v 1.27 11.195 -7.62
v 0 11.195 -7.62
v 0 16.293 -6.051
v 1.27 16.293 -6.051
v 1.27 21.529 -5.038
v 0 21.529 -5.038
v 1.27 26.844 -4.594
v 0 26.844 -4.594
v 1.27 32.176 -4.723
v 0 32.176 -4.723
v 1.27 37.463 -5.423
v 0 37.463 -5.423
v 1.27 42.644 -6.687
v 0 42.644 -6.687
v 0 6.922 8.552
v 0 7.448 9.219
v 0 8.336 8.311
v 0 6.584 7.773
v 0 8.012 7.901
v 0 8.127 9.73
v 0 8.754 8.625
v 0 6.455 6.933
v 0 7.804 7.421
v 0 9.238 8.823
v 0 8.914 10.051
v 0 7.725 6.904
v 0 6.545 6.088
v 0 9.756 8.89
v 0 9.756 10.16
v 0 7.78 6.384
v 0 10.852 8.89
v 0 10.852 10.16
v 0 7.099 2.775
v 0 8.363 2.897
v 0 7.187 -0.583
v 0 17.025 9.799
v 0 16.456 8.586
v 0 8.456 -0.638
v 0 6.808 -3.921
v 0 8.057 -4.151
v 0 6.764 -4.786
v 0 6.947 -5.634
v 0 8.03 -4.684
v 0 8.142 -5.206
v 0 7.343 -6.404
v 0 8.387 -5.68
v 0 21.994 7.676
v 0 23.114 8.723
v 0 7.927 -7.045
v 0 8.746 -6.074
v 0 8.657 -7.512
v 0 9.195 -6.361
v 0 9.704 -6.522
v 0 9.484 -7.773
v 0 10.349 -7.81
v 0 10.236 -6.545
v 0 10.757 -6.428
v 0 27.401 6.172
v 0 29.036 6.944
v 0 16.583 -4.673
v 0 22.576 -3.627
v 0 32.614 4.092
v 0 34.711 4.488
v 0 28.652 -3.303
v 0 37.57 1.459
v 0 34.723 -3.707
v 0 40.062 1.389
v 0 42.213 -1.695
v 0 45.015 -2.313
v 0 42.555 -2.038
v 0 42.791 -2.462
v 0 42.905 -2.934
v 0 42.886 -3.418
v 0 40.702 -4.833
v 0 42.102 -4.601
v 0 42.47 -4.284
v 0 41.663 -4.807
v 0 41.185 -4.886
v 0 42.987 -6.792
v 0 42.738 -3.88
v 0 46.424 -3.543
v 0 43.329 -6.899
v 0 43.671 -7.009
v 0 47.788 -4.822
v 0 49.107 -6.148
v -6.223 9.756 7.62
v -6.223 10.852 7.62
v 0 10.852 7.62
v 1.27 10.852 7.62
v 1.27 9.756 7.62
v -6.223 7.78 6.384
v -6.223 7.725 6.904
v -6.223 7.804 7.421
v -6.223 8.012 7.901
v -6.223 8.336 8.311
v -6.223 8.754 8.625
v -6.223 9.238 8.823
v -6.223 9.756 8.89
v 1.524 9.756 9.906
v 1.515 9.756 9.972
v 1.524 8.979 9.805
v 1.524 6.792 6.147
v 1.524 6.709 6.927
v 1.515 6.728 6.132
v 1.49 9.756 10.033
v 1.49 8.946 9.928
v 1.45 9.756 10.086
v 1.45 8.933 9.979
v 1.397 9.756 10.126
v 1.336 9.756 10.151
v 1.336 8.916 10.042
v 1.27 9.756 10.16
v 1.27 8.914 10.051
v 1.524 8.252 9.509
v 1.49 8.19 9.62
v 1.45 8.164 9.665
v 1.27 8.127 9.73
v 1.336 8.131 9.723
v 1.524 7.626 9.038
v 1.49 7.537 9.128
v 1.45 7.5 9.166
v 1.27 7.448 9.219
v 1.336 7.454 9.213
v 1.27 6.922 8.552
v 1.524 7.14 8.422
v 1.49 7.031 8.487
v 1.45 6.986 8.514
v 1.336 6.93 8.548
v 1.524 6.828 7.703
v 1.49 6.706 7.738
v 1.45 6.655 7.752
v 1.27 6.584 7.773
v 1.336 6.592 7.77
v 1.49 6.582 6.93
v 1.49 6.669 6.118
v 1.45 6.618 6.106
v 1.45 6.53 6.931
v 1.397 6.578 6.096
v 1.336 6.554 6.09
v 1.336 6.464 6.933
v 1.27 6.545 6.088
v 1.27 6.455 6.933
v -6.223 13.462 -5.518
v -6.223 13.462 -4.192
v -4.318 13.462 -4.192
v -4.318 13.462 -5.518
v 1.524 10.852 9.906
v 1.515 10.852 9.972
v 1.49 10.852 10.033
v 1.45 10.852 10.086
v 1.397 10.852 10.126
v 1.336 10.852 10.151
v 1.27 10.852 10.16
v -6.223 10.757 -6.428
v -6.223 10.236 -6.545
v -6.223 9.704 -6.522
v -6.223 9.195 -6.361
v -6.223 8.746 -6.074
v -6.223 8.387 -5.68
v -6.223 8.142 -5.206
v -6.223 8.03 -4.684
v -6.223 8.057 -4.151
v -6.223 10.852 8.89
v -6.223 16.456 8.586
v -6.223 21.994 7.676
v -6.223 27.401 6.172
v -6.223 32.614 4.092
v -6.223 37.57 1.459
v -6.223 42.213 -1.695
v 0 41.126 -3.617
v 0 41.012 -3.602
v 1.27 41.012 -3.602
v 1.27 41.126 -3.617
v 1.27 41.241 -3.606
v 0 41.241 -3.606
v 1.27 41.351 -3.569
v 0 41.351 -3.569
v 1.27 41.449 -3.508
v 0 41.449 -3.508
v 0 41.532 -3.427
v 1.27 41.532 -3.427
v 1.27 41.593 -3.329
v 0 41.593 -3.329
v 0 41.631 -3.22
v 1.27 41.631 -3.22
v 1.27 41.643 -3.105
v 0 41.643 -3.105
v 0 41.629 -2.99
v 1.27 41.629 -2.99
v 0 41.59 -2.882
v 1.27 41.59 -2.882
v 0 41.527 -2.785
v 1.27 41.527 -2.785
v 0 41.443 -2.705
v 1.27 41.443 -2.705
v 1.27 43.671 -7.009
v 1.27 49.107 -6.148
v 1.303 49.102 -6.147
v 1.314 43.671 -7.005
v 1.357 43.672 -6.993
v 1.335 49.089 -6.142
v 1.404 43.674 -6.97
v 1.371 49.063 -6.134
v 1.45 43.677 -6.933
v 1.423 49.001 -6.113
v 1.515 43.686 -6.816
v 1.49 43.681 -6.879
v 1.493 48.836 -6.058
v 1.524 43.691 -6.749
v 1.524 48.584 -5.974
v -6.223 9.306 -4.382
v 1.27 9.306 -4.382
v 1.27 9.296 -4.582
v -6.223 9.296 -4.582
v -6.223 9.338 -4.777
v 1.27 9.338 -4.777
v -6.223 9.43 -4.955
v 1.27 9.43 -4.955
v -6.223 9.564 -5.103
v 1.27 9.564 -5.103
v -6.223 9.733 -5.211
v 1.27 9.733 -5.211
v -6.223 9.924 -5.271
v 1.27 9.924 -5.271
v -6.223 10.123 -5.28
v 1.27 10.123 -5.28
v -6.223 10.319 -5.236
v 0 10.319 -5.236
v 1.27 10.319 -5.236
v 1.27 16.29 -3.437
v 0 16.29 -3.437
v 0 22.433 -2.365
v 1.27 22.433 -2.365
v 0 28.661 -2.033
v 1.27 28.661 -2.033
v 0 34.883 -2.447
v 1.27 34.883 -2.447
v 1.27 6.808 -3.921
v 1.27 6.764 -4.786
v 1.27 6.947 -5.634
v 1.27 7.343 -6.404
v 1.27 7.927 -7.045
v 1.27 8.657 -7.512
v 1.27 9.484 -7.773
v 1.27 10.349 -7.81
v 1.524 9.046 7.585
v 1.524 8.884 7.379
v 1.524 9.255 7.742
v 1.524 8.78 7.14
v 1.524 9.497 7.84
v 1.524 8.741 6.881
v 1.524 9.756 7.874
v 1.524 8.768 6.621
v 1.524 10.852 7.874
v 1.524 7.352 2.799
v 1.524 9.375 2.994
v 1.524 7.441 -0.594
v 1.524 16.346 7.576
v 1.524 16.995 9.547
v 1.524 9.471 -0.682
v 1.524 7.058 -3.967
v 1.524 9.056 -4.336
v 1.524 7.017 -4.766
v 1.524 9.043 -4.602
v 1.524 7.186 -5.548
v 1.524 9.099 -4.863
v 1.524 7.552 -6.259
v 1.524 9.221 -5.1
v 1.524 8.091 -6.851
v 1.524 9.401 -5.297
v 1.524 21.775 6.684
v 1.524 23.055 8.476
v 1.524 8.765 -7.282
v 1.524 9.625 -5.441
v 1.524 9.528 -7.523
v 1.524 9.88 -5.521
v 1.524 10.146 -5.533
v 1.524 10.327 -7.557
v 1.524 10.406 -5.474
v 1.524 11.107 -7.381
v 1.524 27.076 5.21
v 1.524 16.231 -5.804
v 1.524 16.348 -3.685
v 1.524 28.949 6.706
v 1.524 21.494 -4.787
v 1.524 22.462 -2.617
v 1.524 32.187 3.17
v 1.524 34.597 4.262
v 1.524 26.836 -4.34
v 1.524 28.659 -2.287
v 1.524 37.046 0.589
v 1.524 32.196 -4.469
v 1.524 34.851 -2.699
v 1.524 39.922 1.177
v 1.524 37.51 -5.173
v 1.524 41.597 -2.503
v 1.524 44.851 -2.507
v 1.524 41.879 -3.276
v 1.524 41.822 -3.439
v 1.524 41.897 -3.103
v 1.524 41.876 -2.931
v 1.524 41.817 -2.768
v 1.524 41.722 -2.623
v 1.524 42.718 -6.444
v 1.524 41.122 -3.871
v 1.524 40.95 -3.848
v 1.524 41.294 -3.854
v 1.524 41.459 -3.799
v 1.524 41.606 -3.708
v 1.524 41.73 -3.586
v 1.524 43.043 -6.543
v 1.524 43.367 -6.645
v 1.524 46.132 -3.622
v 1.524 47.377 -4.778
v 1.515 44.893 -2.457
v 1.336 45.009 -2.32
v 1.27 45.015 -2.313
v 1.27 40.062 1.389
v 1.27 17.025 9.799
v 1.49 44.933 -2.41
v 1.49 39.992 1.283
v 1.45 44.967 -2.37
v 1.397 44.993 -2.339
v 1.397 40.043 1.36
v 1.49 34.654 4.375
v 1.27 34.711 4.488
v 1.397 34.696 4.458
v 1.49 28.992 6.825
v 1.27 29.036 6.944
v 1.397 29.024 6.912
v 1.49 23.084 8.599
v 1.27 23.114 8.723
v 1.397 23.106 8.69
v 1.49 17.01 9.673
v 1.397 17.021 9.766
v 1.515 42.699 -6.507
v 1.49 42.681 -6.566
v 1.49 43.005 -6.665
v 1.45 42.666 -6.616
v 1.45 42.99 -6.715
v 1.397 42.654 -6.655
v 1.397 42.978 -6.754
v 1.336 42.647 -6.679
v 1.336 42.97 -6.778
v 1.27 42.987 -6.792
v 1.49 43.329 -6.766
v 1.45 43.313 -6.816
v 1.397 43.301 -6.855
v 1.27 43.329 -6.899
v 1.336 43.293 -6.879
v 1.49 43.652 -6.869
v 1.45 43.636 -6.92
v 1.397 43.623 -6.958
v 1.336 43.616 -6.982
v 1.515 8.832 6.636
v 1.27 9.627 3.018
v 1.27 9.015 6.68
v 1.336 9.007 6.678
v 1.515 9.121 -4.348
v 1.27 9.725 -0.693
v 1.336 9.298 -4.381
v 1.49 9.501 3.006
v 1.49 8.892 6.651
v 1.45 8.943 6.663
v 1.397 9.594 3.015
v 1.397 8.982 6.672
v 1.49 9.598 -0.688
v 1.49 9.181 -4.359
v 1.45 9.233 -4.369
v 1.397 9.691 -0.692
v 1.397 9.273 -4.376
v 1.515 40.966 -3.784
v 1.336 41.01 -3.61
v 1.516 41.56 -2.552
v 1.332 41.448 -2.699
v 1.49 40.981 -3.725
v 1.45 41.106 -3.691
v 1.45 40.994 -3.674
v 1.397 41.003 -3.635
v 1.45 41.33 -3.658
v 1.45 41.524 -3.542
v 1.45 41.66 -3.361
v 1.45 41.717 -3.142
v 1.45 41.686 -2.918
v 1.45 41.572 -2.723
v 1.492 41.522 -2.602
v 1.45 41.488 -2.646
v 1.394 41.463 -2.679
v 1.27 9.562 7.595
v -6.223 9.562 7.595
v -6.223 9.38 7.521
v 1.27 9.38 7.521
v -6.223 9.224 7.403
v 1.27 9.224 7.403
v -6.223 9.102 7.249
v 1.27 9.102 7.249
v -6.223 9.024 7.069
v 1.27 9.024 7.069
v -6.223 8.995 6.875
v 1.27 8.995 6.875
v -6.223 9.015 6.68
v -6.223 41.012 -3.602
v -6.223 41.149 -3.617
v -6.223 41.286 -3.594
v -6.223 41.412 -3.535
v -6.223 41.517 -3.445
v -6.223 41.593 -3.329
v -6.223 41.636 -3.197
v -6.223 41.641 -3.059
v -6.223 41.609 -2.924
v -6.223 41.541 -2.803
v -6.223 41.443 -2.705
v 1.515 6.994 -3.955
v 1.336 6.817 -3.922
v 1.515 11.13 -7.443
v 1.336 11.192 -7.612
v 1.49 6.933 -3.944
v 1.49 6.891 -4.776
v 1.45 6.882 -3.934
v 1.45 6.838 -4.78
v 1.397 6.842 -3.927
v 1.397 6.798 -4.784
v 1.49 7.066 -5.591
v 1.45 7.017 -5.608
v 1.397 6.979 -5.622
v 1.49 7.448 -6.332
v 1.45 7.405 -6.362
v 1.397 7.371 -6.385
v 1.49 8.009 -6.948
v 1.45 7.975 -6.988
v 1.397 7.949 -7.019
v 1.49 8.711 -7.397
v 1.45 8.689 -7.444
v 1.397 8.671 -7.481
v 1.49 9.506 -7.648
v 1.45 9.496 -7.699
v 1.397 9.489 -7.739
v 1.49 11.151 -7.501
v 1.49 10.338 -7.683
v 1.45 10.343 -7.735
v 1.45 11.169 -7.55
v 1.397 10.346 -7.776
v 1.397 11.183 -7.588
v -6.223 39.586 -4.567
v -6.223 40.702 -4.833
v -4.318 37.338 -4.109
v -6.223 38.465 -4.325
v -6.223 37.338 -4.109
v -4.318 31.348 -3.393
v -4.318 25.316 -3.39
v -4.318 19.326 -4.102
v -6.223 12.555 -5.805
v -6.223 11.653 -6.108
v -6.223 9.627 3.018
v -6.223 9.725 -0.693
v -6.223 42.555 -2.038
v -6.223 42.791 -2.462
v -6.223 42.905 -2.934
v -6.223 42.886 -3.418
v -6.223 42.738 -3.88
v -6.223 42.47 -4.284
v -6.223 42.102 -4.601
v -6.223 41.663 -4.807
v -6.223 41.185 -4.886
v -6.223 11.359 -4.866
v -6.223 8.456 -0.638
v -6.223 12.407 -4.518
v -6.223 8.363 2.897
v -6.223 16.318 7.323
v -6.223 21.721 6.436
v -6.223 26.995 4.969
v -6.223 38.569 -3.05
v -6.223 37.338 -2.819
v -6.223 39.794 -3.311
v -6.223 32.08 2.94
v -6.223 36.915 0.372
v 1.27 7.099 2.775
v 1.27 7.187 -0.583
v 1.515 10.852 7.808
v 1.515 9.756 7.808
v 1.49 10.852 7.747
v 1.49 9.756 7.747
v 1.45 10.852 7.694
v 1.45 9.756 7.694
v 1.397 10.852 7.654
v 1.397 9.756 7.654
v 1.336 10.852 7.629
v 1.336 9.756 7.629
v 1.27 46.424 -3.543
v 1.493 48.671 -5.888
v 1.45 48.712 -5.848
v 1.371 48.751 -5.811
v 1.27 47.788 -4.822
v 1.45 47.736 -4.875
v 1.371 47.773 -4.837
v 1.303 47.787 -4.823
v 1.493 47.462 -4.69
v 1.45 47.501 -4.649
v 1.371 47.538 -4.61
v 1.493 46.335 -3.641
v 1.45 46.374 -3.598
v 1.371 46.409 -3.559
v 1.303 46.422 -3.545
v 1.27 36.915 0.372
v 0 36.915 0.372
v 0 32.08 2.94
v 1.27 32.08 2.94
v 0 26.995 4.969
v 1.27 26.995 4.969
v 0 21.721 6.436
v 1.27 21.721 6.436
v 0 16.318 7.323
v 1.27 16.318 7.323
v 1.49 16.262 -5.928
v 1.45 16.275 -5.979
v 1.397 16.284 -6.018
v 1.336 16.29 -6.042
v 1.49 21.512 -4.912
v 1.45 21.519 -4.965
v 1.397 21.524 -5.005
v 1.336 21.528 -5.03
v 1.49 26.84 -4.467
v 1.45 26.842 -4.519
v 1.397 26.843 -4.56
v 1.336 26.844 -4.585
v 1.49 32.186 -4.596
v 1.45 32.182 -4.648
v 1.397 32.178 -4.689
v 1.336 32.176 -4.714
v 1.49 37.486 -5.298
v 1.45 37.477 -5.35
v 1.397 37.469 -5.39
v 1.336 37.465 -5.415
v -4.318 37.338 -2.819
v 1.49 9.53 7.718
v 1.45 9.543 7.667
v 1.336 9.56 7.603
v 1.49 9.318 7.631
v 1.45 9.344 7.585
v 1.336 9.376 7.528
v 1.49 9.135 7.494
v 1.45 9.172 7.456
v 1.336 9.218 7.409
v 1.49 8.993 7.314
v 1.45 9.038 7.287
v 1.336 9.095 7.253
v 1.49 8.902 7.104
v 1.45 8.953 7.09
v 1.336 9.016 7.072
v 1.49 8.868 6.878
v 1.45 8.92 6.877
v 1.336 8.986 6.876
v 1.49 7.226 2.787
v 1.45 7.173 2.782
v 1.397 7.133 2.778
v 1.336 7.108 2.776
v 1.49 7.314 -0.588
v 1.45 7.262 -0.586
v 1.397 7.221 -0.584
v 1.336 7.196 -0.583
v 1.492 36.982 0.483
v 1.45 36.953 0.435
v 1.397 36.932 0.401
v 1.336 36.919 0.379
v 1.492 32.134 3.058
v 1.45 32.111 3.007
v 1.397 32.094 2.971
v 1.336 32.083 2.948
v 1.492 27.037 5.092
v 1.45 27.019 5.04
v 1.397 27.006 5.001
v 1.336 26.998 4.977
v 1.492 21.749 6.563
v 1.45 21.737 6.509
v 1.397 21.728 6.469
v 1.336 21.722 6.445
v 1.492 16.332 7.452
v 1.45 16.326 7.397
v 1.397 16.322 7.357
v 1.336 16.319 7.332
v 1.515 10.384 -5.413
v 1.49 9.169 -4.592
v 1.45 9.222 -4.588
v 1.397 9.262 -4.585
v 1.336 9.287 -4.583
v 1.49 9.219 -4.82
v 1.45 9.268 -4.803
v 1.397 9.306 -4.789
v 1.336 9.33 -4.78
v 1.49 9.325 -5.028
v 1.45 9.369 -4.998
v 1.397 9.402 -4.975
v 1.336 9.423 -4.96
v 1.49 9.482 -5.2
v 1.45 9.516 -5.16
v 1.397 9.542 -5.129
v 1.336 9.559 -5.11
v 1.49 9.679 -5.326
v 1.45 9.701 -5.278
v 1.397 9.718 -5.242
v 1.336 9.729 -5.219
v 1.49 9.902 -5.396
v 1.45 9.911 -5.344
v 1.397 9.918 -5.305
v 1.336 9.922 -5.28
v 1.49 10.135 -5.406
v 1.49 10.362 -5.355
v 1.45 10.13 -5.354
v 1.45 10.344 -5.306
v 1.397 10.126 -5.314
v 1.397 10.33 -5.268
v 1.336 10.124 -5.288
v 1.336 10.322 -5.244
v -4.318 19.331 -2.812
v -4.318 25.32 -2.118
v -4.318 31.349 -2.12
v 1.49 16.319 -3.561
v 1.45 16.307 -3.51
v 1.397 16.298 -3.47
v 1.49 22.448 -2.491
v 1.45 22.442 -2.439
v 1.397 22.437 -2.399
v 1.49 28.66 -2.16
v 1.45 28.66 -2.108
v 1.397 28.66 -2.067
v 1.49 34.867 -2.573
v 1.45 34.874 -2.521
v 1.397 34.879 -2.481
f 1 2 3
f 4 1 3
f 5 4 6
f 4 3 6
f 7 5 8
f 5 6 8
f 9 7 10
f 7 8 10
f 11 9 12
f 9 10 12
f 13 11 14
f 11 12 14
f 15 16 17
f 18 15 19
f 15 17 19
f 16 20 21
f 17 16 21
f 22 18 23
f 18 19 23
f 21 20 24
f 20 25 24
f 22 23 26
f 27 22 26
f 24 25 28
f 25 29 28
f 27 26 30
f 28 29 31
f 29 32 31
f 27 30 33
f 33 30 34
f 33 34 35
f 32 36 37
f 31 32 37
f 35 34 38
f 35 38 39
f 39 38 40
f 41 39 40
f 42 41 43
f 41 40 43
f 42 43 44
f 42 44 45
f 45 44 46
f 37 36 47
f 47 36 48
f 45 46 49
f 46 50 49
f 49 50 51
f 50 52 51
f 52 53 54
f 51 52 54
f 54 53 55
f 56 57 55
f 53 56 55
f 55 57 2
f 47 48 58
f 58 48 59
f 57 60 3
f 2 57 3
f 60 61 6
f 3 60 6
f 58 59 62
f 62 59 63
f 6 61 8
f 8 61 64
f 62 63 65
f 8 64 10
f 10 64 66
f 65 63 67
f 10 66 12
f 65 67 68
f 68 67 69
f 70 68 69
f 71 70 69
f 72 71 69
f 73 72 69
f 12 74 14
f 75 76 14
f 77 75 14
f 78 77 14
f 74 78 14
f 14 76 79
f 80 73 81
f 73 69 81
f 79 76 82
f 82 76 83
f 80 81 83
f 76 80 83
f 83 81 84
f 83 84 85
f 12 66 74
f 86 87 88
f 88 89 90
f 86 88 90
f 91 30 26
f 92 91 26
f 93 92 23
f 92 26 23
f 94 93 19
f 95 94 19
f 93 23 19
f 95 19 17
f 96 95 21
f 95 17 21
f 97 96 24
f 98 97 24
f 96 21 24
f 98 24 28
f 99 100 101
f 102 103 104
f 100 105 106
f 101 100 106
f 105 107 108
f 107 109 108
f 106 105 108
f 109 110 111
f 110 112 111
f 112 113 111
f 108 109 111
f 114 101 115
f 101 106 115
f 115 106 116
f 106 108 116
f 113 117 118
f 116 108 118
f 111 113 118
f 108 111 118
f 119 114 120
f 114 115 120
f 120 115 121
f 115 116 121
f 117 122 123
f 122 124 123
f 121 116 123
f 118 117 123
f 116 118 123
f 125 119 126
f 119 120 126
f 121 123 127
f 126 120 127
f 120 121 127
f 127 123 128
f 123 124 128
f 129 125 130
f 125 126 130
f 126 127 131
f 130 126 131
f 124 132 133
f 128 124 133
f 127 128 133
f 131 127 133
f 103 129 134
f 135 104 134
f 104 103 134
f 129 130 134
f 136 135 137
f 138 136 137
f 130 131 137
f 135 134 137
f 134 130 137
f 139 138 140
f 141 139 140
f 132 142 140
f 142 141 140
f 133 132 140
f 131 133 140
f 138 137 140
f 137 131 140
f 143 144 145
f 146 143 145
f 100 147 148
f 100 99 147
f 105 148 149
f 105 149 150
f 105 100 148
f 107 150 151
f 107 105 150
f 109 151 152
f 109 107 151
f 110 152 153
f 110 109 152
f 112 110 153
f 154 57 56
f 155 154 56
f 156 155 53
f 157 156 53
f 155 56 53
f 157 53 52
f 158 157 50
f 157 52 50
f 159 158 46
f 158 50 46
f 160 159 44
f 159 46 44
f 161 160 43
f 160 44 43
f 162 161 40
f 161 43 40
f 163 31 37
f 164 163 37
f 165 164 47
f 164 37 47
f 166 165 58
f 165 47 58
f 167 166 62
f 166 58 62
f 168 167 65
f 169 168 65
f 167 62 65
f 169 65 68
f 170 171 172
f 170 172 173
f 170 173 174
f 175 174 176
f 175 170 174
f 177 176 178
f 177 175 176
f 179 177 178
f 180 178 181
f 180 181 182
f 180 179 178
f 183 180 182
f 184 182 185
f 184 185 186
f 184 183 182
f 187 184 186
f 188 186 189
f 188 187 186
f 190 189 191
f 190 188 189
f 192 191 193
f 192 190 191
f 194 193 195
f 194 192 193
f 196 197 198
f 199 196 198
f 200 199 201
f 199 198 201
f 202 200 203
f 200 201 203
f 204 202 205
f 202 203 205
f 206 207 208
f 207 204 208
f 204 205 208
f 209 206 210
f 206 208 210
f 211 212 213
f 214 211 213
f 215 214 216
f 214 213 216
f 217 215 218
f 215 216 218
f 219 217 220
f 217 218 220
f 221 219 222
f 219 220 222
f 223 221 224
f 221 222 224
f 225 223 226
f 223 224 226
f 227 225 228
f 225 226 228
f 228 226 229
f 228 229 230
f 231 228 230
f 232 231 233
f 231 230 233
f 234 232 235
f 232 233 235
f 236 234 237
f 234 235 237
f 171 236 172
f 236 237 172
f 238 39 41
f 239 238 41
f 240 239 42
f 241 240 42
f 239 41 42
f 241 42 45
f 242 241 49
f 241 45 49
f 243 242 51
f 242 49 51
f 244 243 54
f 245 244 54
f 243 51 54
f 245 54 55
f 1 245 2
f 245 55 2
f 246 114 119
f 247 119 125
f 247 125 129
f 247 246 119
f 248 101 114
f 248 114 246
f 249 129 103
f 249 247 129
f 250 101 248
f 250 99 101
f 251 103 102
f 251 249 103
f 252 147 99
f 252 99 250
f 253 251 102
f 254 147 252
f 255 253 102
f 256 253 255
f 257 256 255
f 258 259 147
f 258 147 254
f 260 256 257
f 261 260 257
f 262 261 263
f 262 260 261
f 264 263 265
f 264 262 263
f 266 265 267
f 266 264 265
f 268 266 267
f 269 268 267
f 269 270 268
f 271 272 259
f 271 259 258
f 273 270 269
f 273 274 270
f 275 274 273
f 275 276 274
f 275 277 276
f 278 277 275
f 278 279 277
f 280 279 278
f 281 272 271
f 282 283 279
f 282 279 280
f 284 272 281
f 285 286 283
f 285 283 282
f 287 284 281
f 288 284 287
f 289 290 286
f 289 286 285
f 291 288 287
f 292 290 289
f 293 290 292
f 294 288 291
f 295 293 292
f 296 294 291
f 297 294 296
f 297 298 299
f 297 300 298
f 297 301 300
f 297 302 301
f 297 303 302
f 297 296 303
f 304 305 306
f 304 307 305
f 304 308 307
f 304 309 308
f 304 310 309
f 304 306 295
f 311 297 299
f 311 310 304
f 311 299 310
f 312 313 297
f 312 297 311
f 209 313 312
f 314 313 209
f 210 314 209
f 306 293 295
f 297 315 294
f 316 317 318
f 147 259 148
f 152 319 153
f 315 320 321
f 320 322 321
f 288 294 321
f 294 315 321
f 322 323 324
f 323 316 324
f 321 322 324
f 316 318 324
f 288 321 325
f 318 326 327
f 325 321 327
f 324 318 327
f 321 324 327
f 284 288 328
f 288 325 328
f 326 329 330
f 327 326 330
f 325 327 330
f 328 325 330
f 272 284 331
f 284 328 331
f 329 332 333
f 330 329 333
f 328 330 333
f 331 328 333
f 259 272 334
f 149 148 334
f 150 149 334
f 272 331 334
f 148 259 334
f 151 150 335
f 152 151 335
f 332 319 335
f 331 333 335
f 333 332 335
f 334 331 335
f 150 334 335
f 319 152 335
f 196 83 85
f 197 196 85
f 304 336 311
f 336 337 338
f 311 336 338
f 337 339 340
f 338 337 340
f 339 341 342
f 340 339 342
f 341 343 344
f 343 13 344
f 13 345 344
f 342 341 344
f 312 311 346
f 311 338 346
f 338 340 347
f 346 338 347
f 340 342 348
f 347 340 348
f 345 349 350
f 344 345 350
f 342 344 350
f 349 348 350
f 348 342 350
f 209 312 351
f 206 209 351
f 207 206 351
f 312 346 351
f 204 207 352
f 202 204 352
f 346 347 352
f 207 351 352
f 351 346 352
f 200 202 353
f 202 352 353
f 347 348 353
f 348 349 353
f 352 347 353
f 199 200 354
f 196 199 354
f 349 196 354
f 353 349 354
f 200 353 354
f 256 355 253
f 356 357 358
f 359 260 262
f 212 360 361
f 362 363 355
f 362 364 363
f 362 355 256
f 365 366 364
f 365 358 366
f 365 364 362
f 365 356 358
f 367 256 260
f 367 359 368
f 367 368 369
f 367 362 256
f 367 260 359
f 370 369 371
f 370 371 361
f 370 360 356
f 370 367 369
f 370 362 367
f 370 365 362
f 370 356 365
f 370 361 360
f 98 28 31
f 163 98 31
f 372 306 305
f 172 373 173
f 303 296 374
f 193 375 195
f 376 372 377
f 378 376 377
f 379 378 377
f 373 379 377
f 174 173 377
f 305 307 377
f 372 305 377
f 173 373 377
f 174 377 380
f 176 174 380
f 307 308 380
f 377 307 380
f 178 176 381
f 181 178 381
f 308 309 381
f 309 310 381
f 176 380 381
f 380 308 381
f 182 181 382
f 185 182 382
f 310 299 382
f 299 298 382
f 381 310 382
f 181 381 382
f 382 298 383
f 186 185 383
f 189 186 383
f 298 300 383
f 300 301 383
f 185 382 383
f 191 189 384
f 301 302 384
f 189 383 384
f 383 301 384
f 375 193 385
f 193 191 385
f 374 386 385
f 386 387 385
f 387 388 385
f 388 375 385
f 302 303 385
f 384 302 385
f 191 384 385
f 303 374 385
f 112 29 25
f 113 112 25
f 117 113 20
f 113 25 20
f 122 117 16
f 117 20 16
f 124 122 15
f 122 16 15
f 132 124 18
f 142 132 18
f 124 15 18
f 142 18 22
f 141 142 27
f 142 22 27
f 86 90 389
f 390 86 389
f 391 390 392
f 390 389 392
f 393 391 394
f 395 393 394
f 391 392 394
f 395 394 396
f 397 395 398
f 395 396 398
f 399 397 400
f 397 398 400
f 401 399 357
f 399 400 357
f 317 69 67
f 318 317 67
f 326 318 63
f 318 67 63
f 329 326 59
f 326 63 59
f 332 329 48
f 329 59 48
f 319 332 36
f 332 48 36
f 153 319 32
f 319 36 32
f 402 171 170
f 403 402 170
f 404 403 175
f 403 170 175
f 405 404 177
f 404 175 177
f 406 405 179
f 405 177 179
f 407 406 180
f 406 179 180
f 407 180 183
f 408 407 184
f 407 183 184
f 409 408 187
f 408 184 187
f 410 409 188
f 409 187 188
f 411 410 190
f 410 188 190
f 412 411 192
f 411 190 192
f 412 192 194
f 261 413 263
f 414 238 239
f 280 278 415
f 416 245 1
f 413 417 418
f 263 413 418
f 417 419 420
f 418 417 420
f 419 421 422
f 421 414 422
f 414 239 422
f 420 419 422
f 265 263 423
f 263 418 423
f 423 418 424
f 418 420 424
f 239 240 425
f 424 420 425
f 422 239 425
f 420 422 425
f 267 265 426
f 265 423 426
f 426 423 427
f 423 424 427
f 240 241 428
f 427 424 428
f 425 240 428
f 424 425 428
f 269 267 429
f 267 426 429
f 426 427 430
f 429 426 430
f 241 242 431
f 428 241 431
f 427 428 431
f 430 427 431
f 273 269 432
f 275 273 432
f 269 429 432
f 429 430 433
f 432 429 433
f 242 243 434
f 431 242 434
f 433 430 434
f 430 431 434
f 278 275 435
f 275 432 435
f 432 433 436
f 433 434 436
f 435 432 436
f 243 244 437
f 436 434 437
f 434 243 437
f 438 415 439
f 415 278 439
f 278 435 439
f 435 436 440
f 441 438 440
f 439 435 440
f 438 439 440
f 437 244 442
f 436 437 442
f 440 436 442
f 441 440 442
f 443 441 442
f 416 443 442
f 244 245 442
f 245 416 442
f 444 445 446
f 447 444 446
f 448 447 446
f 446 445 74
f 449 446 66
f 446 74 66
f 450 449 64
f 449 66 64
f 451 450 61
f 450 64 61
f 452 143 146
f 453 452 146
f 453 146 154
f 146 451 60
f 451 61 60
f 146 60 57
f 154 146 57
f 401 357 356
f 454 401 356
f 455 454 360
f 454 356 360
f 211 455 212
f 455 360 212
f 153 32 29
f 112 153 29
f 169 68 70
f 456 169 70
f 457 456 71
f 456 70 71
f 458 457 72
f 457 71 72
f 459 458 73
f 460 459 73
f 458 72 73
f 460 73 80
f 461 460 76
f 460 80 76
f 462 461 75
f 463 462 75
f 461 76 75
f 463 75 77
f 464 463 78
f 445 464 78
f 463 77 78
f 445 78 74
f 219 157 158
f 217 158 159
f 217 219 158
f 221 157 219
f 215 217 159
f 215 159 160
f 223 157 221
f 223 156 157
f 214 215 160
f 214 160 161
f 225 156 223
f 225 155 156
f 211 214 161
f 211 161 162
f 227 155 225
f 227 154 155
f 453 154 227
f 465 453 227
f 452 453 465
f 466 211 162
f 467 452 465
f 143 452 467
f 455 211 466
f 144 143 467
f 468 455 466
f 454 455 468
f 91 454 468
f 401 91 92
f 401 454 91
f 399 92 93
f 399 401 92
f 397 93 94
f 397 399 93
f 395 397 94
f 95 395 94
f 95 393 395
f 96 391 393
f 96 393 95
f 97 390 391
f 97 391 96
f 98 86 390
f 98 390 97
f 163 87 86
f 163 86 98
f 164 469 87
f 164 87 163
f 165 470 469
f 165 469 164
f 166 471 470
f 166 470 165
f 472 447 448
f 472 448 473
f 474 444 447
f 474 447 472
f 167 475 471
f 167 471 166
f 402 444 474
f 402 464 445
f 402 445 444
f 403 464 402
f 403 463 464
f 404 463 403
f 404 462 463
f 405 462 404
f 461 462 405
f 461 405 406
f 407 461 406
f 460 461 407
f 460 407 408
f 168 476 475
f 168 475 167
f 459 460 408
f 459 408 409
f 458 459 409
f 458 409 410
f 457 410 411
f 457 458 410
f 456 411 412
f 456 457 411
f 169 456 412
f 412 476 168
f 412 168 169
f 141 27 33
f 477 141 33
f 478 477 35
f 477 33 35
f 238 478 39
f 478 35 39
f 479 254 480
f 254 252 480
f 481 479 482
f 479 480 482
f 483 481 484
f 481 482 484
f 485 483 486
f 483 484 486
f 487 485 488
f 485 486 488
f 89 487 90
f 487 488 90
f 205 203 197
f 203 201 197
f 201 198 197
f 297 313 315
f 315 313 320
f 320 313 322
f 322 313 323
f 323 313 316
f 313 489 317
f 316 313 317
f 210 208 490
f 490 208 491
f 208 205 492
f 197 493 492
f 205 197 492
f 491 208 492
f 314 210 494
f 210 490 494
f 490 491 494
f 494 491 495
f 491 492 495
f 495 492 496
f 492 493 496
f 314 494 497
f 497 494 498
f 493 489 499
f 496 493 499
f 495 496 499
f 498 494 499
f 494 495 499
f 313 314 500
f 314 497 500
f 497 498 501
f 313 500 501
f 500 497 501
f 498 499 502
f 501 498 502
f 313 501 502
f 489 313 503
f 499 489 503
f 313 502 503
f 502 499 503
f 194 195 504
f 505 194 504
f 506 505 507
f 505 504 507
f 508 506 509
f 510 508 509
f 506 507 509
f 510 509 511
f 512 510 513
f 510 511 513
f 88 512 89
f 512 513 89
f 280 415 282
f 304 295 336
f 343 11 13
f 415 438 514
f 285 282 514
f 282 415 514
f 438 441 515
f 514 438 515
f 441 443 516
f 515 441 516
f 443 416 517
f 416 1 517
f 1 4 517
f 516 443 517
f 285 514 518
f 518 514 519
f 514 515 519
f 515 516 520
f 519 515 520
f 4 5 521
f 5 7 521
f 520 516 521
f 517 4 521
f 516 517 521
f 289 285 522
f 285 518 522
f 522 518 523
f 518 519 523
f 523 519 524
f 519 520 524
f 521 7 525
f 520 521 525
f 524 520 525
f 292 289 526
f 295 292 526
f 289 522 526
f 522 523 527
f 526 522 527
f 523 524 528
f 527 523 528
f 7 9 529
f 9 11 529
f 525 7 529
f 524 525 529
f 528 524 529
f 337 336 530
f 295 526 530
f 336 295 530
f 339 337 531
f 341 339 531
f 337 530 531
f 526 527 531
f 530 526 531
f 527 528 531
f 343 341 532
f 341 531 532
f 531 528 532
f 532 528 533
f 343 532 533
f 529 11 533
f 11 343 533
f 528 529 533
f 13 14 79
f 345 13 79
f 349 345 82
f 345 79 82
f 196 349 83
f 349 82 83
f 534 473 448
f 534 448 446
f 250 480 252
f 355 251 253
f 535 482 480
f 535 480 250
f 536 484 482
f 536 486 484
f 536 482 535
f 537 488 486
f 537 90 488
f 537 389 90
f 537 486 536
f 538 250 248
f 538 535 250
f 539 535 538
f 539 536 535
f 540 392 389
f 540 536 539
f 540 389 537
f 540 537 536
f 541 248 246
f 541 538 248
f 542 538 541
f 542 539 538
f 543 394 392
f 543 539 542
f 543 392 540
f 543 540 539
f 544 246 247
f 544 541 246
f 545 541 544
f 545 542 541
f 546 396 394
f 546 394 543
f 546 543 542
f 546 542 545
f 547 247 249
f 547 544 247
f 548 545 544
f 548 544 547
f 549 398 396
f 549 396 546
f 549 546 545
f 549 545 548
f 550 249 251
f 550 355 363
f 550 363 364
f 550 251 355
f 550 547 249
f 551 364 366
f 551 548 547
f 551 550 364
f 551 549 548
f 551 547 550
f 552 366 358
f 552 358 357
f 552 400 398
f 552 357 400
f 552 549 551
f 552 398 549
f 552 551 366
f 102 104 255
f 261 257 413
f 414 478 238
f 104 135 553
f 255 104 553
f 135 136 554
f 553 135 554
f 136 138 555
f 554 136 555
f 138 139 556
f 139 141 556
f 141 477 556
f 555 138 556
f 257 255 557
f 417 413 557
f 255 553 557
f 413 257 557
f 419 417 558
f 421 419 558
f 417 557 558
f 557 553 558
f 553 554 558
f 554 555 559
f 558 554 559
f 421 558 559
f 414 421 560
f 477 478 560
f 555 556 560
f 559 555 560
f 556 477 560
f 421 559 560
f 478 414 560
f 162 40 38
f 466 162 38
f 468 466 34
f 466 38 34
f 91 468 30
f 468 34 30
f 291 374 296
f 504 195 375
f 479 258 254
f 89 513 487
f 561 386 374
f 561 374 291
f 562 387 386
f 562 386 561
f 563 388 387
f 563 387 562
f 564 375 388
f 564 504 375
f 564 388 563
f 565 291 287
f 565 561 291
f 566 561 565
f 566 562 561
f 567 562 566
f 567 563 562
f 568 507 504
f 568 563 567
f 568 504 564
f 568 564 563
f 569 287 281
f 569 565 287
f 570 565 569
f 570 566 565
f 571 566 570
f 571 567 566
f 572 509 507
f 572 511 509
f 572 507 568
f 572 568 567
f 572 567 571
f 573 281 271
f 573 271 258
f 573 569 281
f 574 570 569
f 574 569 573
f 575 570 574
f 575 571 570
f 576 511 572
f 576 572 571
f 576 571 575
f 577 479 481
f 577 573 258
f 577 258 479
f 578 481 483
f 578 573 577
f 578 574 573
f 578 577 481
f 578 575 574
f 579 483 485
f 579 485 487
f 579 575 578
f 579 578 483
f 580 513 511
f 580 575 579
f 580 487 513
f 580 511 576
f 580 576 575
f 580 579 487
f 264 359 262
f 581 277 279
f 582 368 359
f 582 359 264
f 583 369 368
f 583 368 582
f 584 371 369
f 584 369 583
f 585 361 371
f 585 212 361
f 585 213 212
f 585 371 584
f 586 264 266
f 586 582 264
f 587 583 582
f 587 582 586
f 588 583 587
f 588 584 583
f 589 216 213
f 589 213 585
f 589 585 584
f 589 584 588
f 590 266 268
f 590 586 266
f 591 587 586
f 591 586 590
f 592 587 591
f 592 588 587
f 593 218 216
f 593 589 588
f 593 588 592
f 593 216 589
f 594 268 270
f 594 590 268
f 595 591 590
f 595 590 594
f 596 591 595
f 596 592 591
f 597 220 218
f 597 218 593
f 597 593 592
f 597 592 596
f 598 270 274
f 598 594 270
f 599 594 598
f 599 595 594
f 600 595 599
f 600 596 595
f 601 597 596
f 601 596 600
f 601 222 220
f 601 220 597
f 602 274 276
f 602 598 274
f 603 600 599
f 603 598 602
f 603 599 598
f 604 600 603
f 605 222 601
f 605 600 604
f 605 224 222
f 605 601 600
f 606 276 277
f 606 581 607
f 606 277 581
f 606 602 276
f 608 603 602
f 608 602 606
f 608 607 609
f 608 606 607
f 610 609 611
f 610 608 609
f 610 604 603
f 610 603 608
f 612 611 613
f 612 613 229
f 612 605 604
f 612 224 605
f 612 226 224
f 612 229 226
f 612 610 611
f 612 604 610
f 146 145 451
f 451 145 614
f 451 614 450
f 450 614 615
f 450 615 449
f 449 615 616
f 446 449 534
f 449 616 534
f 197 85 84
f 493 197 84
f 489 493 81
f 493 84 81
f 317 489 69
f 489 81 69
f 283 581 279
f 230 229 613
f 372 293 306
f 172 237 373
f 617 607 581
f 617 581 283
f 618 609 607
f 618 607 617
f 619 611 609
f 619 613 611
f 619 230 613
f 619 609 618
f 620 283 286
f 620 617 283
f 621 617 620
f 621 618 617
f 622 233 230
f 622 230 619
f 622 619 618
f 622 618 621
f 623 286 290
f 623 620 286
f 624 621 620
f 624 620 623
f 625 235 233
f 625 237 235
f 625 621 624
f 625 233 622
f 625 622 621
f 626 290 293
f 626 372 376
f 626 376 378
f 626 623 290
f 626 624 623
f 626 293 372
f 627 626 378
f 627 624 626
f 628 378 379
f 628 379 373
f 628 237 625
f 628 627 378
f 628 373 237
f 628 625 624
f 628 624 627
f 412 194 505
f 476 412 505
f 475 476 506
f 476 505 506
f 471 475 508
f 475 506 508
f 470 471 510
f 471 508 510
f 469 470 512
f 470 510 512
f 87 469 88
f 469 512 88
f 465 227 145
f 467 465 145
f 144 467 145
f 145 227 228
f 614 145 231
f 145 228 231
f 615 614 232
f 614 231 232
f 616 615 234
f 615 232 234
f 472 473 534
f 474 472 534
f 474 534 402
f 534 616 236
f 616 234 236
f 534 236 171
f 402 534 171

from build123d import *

# Parameters (mm, degrees)
BOSS_EXTRUDE1_DEPTH         = 1.524
KES_EKSTR_ZYON1_DEPTH       = 2.54
RADYUS1_R                   = 0.508
Y_KSEKLIK_EKSTR_ZYON1_DEPTH = 6.223
Y_KSEKLIK_EKSTR_ZYON2_START = -1.524
Y_KSEKLIK_EKSTR_ZYON2_DEPTH = 1.524
IZIM5_W                     = 1.905
IZIM5_H                     = 23.876
KES_EKSTR_ZYON2_DEPTH       = 9.779
RADYUS2_R                   = 0.254


with BuildPart() as part:
    # Sketch2 → Boss-Extrude1 (new body)
    with BuildSketch(Plane(origin=(0, 0, 0), x_dir=(0, 0, -1), z_dir=(1, 0, 0))):
        with BuildLine():
            Line((-10.16, 10.851579944), (-10.16, 9.756379827))
            ThreePointArc((-10.16, 9.756379827), (-8.902698353, 7.16361824), (-6.088278228, 6.54534691))
            ThreePointArc((-6.088278228, 6.54534691), (-1.097578785, 7.201770952), (3.920718614, 6.808496661))
            ThreePointArc((3.920718614, 6.808496661), (7.044965017, 7.926917254), (7.619757818, 11.195157369))
            ThreePointArc((7.619757818, 11.195157369), (4.593793799, 26.843864795), (6.687175028, 42.644379261))
            ThreePointArc((6.687175028, 42.644379261), (5.465660141, 45.611386582), (2.312998216, 45.014767901))
            ThreePointArc((2.312998216, 45.014767901), (-6.944233805, 29.036045126), (-10.16, 10.851579944))
        make_face()
    extrude(amount=BOSS_EXTRUDE1_DEPTH)

    # Sketch3 → Kes-Ekstrüzyon1 (cut)
    with BuildSketch(Plane(origin=(1.524, 0, 0), x_dir=(0, 0, -1), z_dir=(1, 0, 0))):
        with BuildLine():
            Line((-7.62, 10.851579944), (-7.62, 9.756379827))
            ThreePointArc((-7.62, 9.756379827), (-7.329853466, 9.15805023), (-6.680371899, 9.015372231))
            ThreePointArc((-6.680371899, 9.015372231), (-1.164335672, 9.74089354), (4.382203558, 9.306221955))
            ThreePointArc((4.382203558, 9.306221955), (5.103183497, 9.564319015), (5.23582799, 10.318528273))
            ThreePointArc((5.23582799, 10.318528273), (2.05490982, 26.768577734), (4.25548932, 43.378207999))
            ThreePointArc((4.25548932, 43.378207999), (-4.558282485, 28.164933022), (-7.62, 10.851579944))
        make_face()
    extrude(amount=-KES_EKSTR_ZYON1_DEPTH, mode=Mode.SUBTRACT)

    # Radyus1
    radyus1_edges = [part.edges().sort_by_distance(p)[0] for p in [
        (0.762, 43.378207999, -4.25548932),
    ]]
    fillet(radyus1_edges, radius=RADYUS1_R)

    # Çizim3 → Yükseklik-Ekstrüzyon1 (add)
    with BuildSketch(Plane.ZY):
        with BuildLine():
            Line((8.89, 9.756379827), (8.89, 10.851579944))
            ThreePointArc((8.89, 10.851579944), (6.172491894, 27.401227257), (-1.694641367, 42.212840631))
            ThreePointArc((-1.694641367, 42.212840631), (-3.87996363, 42.737551733), (-4.833471032, 40.702415677))
            ThreePointArc((-4.833471032, 40.702415677), (-3.373946338, 25.609481831), (-6.427792904, 10.756842821))
            ThreePointArc((-6.427792904, 10.756842821), (-6.074074257, 8.745618135), (-4.151461086, 8.057359308))
            ThreePointArc((-4.151461086, 8.057359308), (1.130957229, 8.471332246), (6.384325063, 7.78035957))
            ThreePointArc((6.384325063, 7.78035957), (8.116275909, 8.160834235), (8.89, 9.756379827))
        make_face()
        with BuildLine():
            Line((7.62, 10.851579944), (7.62, 9.756379827))
            ThreePointArc((7.62, 9.756379827), (7.329853466, 9.15805023), (6.680371899, 9.015372231))
            ThreePointArc((6.680371899, 9.015372231), (1.164335672, 9.74089354), (-4.382203558, 9.306221955))
            ThreePointArc((-4.382203558, 9.306221955), (-5.103183497, 9.564319015), (-5.23582799, 10.318528273))
            ThreePointArc((-5.23582799, 10.318528273), (-2.10574247, 25.541961828), (-3.601704042, 41.011689155))
            ThreePointArc((-3.601704042, 41.011689155), (-3.329273356, 41.593156599), (-2.704895567, 41.443239142))
            ThreePointArc((-2.704895567, 41.443239142), (4.96917921, 26.995100943), (7.62, 10.851579944))
        make_face(mode=Mode.SUBTRACT)
    extrude(amount=Y_KSEKLIK_EKSTR_ZYON1_DEPTH)

    # Sketch5 → Yükseklik-Ekstrüzyon2 (add)
    with BuildSketch(Plane(origin=(1.524, 0, 0), x_dir=(0, 0, -1), z_dir=(1, 0, 0)).offset(Y_KSEKLIK_EKSTR_ZYON2_START)):
        with BuildLine():
            Line((7.009110806, 43.67080126), (6.148171078, 49.106560771))
            ThreePointArc((6.148171078, 49.106560771), (3.588810081, 46.474083877), (1.217761815, 43.67080126))
            Line((1.217761815, 43.67080126), (6.534669415, 42.12894069))
            ThreePointArc((6.534669415, 42.12894069), (6.765621389, 42.901799905), (7.009110806, 43.67080126))
        make_face()
    extrude(amount=Y_KSEKLIK_EKSTR_ZYON2_DEPTH)

    # Çizim5 → Kes-Ekstrüzyon2 (cut)
    with BuildSketch(Plane.XY):
        with Locations((-5.2705, 25.4)):
            Rectangle(IZIM5_W, IZIM5_H)
    extrude(amount=-KES_EKSTR_ZYON2_DEPTH, mode=Mode.SUBTRACT)

    # Radyus2
    radyus2_edges = [part.edges().sort_by_distance(p)[0] for p in [
        (1.524, 31.644607634, 5.912857567),
        (1.524, 10.303979886, 10.16),
        (1.524, 7.16361824, 8.902698353),
        (1.524, 7.201770952, 1.097578785),
        (1.524, 7.926917254, -7.044965017),
        (1.524, 9.74089354, 1.164335672),
        (1.524, 10.303979886, 7.62),
        (1.524, 9.15805023, 7.329853466),
        (1.524, 9.564319015, -5.103183497),
        (1.524, 27.381577524, -4.580766254),
        (1.524, 26.995100943, 4.96917921),
        (1.524, 25.541961828, -2.10574247),
        (1.524, 41.593156599, -3.329273357),
        (1.524, 46.388681016, -6.578640942),
    ]]
    fillet(radyus2_edges, radius=RADYUS2_R)


solid = part.part
